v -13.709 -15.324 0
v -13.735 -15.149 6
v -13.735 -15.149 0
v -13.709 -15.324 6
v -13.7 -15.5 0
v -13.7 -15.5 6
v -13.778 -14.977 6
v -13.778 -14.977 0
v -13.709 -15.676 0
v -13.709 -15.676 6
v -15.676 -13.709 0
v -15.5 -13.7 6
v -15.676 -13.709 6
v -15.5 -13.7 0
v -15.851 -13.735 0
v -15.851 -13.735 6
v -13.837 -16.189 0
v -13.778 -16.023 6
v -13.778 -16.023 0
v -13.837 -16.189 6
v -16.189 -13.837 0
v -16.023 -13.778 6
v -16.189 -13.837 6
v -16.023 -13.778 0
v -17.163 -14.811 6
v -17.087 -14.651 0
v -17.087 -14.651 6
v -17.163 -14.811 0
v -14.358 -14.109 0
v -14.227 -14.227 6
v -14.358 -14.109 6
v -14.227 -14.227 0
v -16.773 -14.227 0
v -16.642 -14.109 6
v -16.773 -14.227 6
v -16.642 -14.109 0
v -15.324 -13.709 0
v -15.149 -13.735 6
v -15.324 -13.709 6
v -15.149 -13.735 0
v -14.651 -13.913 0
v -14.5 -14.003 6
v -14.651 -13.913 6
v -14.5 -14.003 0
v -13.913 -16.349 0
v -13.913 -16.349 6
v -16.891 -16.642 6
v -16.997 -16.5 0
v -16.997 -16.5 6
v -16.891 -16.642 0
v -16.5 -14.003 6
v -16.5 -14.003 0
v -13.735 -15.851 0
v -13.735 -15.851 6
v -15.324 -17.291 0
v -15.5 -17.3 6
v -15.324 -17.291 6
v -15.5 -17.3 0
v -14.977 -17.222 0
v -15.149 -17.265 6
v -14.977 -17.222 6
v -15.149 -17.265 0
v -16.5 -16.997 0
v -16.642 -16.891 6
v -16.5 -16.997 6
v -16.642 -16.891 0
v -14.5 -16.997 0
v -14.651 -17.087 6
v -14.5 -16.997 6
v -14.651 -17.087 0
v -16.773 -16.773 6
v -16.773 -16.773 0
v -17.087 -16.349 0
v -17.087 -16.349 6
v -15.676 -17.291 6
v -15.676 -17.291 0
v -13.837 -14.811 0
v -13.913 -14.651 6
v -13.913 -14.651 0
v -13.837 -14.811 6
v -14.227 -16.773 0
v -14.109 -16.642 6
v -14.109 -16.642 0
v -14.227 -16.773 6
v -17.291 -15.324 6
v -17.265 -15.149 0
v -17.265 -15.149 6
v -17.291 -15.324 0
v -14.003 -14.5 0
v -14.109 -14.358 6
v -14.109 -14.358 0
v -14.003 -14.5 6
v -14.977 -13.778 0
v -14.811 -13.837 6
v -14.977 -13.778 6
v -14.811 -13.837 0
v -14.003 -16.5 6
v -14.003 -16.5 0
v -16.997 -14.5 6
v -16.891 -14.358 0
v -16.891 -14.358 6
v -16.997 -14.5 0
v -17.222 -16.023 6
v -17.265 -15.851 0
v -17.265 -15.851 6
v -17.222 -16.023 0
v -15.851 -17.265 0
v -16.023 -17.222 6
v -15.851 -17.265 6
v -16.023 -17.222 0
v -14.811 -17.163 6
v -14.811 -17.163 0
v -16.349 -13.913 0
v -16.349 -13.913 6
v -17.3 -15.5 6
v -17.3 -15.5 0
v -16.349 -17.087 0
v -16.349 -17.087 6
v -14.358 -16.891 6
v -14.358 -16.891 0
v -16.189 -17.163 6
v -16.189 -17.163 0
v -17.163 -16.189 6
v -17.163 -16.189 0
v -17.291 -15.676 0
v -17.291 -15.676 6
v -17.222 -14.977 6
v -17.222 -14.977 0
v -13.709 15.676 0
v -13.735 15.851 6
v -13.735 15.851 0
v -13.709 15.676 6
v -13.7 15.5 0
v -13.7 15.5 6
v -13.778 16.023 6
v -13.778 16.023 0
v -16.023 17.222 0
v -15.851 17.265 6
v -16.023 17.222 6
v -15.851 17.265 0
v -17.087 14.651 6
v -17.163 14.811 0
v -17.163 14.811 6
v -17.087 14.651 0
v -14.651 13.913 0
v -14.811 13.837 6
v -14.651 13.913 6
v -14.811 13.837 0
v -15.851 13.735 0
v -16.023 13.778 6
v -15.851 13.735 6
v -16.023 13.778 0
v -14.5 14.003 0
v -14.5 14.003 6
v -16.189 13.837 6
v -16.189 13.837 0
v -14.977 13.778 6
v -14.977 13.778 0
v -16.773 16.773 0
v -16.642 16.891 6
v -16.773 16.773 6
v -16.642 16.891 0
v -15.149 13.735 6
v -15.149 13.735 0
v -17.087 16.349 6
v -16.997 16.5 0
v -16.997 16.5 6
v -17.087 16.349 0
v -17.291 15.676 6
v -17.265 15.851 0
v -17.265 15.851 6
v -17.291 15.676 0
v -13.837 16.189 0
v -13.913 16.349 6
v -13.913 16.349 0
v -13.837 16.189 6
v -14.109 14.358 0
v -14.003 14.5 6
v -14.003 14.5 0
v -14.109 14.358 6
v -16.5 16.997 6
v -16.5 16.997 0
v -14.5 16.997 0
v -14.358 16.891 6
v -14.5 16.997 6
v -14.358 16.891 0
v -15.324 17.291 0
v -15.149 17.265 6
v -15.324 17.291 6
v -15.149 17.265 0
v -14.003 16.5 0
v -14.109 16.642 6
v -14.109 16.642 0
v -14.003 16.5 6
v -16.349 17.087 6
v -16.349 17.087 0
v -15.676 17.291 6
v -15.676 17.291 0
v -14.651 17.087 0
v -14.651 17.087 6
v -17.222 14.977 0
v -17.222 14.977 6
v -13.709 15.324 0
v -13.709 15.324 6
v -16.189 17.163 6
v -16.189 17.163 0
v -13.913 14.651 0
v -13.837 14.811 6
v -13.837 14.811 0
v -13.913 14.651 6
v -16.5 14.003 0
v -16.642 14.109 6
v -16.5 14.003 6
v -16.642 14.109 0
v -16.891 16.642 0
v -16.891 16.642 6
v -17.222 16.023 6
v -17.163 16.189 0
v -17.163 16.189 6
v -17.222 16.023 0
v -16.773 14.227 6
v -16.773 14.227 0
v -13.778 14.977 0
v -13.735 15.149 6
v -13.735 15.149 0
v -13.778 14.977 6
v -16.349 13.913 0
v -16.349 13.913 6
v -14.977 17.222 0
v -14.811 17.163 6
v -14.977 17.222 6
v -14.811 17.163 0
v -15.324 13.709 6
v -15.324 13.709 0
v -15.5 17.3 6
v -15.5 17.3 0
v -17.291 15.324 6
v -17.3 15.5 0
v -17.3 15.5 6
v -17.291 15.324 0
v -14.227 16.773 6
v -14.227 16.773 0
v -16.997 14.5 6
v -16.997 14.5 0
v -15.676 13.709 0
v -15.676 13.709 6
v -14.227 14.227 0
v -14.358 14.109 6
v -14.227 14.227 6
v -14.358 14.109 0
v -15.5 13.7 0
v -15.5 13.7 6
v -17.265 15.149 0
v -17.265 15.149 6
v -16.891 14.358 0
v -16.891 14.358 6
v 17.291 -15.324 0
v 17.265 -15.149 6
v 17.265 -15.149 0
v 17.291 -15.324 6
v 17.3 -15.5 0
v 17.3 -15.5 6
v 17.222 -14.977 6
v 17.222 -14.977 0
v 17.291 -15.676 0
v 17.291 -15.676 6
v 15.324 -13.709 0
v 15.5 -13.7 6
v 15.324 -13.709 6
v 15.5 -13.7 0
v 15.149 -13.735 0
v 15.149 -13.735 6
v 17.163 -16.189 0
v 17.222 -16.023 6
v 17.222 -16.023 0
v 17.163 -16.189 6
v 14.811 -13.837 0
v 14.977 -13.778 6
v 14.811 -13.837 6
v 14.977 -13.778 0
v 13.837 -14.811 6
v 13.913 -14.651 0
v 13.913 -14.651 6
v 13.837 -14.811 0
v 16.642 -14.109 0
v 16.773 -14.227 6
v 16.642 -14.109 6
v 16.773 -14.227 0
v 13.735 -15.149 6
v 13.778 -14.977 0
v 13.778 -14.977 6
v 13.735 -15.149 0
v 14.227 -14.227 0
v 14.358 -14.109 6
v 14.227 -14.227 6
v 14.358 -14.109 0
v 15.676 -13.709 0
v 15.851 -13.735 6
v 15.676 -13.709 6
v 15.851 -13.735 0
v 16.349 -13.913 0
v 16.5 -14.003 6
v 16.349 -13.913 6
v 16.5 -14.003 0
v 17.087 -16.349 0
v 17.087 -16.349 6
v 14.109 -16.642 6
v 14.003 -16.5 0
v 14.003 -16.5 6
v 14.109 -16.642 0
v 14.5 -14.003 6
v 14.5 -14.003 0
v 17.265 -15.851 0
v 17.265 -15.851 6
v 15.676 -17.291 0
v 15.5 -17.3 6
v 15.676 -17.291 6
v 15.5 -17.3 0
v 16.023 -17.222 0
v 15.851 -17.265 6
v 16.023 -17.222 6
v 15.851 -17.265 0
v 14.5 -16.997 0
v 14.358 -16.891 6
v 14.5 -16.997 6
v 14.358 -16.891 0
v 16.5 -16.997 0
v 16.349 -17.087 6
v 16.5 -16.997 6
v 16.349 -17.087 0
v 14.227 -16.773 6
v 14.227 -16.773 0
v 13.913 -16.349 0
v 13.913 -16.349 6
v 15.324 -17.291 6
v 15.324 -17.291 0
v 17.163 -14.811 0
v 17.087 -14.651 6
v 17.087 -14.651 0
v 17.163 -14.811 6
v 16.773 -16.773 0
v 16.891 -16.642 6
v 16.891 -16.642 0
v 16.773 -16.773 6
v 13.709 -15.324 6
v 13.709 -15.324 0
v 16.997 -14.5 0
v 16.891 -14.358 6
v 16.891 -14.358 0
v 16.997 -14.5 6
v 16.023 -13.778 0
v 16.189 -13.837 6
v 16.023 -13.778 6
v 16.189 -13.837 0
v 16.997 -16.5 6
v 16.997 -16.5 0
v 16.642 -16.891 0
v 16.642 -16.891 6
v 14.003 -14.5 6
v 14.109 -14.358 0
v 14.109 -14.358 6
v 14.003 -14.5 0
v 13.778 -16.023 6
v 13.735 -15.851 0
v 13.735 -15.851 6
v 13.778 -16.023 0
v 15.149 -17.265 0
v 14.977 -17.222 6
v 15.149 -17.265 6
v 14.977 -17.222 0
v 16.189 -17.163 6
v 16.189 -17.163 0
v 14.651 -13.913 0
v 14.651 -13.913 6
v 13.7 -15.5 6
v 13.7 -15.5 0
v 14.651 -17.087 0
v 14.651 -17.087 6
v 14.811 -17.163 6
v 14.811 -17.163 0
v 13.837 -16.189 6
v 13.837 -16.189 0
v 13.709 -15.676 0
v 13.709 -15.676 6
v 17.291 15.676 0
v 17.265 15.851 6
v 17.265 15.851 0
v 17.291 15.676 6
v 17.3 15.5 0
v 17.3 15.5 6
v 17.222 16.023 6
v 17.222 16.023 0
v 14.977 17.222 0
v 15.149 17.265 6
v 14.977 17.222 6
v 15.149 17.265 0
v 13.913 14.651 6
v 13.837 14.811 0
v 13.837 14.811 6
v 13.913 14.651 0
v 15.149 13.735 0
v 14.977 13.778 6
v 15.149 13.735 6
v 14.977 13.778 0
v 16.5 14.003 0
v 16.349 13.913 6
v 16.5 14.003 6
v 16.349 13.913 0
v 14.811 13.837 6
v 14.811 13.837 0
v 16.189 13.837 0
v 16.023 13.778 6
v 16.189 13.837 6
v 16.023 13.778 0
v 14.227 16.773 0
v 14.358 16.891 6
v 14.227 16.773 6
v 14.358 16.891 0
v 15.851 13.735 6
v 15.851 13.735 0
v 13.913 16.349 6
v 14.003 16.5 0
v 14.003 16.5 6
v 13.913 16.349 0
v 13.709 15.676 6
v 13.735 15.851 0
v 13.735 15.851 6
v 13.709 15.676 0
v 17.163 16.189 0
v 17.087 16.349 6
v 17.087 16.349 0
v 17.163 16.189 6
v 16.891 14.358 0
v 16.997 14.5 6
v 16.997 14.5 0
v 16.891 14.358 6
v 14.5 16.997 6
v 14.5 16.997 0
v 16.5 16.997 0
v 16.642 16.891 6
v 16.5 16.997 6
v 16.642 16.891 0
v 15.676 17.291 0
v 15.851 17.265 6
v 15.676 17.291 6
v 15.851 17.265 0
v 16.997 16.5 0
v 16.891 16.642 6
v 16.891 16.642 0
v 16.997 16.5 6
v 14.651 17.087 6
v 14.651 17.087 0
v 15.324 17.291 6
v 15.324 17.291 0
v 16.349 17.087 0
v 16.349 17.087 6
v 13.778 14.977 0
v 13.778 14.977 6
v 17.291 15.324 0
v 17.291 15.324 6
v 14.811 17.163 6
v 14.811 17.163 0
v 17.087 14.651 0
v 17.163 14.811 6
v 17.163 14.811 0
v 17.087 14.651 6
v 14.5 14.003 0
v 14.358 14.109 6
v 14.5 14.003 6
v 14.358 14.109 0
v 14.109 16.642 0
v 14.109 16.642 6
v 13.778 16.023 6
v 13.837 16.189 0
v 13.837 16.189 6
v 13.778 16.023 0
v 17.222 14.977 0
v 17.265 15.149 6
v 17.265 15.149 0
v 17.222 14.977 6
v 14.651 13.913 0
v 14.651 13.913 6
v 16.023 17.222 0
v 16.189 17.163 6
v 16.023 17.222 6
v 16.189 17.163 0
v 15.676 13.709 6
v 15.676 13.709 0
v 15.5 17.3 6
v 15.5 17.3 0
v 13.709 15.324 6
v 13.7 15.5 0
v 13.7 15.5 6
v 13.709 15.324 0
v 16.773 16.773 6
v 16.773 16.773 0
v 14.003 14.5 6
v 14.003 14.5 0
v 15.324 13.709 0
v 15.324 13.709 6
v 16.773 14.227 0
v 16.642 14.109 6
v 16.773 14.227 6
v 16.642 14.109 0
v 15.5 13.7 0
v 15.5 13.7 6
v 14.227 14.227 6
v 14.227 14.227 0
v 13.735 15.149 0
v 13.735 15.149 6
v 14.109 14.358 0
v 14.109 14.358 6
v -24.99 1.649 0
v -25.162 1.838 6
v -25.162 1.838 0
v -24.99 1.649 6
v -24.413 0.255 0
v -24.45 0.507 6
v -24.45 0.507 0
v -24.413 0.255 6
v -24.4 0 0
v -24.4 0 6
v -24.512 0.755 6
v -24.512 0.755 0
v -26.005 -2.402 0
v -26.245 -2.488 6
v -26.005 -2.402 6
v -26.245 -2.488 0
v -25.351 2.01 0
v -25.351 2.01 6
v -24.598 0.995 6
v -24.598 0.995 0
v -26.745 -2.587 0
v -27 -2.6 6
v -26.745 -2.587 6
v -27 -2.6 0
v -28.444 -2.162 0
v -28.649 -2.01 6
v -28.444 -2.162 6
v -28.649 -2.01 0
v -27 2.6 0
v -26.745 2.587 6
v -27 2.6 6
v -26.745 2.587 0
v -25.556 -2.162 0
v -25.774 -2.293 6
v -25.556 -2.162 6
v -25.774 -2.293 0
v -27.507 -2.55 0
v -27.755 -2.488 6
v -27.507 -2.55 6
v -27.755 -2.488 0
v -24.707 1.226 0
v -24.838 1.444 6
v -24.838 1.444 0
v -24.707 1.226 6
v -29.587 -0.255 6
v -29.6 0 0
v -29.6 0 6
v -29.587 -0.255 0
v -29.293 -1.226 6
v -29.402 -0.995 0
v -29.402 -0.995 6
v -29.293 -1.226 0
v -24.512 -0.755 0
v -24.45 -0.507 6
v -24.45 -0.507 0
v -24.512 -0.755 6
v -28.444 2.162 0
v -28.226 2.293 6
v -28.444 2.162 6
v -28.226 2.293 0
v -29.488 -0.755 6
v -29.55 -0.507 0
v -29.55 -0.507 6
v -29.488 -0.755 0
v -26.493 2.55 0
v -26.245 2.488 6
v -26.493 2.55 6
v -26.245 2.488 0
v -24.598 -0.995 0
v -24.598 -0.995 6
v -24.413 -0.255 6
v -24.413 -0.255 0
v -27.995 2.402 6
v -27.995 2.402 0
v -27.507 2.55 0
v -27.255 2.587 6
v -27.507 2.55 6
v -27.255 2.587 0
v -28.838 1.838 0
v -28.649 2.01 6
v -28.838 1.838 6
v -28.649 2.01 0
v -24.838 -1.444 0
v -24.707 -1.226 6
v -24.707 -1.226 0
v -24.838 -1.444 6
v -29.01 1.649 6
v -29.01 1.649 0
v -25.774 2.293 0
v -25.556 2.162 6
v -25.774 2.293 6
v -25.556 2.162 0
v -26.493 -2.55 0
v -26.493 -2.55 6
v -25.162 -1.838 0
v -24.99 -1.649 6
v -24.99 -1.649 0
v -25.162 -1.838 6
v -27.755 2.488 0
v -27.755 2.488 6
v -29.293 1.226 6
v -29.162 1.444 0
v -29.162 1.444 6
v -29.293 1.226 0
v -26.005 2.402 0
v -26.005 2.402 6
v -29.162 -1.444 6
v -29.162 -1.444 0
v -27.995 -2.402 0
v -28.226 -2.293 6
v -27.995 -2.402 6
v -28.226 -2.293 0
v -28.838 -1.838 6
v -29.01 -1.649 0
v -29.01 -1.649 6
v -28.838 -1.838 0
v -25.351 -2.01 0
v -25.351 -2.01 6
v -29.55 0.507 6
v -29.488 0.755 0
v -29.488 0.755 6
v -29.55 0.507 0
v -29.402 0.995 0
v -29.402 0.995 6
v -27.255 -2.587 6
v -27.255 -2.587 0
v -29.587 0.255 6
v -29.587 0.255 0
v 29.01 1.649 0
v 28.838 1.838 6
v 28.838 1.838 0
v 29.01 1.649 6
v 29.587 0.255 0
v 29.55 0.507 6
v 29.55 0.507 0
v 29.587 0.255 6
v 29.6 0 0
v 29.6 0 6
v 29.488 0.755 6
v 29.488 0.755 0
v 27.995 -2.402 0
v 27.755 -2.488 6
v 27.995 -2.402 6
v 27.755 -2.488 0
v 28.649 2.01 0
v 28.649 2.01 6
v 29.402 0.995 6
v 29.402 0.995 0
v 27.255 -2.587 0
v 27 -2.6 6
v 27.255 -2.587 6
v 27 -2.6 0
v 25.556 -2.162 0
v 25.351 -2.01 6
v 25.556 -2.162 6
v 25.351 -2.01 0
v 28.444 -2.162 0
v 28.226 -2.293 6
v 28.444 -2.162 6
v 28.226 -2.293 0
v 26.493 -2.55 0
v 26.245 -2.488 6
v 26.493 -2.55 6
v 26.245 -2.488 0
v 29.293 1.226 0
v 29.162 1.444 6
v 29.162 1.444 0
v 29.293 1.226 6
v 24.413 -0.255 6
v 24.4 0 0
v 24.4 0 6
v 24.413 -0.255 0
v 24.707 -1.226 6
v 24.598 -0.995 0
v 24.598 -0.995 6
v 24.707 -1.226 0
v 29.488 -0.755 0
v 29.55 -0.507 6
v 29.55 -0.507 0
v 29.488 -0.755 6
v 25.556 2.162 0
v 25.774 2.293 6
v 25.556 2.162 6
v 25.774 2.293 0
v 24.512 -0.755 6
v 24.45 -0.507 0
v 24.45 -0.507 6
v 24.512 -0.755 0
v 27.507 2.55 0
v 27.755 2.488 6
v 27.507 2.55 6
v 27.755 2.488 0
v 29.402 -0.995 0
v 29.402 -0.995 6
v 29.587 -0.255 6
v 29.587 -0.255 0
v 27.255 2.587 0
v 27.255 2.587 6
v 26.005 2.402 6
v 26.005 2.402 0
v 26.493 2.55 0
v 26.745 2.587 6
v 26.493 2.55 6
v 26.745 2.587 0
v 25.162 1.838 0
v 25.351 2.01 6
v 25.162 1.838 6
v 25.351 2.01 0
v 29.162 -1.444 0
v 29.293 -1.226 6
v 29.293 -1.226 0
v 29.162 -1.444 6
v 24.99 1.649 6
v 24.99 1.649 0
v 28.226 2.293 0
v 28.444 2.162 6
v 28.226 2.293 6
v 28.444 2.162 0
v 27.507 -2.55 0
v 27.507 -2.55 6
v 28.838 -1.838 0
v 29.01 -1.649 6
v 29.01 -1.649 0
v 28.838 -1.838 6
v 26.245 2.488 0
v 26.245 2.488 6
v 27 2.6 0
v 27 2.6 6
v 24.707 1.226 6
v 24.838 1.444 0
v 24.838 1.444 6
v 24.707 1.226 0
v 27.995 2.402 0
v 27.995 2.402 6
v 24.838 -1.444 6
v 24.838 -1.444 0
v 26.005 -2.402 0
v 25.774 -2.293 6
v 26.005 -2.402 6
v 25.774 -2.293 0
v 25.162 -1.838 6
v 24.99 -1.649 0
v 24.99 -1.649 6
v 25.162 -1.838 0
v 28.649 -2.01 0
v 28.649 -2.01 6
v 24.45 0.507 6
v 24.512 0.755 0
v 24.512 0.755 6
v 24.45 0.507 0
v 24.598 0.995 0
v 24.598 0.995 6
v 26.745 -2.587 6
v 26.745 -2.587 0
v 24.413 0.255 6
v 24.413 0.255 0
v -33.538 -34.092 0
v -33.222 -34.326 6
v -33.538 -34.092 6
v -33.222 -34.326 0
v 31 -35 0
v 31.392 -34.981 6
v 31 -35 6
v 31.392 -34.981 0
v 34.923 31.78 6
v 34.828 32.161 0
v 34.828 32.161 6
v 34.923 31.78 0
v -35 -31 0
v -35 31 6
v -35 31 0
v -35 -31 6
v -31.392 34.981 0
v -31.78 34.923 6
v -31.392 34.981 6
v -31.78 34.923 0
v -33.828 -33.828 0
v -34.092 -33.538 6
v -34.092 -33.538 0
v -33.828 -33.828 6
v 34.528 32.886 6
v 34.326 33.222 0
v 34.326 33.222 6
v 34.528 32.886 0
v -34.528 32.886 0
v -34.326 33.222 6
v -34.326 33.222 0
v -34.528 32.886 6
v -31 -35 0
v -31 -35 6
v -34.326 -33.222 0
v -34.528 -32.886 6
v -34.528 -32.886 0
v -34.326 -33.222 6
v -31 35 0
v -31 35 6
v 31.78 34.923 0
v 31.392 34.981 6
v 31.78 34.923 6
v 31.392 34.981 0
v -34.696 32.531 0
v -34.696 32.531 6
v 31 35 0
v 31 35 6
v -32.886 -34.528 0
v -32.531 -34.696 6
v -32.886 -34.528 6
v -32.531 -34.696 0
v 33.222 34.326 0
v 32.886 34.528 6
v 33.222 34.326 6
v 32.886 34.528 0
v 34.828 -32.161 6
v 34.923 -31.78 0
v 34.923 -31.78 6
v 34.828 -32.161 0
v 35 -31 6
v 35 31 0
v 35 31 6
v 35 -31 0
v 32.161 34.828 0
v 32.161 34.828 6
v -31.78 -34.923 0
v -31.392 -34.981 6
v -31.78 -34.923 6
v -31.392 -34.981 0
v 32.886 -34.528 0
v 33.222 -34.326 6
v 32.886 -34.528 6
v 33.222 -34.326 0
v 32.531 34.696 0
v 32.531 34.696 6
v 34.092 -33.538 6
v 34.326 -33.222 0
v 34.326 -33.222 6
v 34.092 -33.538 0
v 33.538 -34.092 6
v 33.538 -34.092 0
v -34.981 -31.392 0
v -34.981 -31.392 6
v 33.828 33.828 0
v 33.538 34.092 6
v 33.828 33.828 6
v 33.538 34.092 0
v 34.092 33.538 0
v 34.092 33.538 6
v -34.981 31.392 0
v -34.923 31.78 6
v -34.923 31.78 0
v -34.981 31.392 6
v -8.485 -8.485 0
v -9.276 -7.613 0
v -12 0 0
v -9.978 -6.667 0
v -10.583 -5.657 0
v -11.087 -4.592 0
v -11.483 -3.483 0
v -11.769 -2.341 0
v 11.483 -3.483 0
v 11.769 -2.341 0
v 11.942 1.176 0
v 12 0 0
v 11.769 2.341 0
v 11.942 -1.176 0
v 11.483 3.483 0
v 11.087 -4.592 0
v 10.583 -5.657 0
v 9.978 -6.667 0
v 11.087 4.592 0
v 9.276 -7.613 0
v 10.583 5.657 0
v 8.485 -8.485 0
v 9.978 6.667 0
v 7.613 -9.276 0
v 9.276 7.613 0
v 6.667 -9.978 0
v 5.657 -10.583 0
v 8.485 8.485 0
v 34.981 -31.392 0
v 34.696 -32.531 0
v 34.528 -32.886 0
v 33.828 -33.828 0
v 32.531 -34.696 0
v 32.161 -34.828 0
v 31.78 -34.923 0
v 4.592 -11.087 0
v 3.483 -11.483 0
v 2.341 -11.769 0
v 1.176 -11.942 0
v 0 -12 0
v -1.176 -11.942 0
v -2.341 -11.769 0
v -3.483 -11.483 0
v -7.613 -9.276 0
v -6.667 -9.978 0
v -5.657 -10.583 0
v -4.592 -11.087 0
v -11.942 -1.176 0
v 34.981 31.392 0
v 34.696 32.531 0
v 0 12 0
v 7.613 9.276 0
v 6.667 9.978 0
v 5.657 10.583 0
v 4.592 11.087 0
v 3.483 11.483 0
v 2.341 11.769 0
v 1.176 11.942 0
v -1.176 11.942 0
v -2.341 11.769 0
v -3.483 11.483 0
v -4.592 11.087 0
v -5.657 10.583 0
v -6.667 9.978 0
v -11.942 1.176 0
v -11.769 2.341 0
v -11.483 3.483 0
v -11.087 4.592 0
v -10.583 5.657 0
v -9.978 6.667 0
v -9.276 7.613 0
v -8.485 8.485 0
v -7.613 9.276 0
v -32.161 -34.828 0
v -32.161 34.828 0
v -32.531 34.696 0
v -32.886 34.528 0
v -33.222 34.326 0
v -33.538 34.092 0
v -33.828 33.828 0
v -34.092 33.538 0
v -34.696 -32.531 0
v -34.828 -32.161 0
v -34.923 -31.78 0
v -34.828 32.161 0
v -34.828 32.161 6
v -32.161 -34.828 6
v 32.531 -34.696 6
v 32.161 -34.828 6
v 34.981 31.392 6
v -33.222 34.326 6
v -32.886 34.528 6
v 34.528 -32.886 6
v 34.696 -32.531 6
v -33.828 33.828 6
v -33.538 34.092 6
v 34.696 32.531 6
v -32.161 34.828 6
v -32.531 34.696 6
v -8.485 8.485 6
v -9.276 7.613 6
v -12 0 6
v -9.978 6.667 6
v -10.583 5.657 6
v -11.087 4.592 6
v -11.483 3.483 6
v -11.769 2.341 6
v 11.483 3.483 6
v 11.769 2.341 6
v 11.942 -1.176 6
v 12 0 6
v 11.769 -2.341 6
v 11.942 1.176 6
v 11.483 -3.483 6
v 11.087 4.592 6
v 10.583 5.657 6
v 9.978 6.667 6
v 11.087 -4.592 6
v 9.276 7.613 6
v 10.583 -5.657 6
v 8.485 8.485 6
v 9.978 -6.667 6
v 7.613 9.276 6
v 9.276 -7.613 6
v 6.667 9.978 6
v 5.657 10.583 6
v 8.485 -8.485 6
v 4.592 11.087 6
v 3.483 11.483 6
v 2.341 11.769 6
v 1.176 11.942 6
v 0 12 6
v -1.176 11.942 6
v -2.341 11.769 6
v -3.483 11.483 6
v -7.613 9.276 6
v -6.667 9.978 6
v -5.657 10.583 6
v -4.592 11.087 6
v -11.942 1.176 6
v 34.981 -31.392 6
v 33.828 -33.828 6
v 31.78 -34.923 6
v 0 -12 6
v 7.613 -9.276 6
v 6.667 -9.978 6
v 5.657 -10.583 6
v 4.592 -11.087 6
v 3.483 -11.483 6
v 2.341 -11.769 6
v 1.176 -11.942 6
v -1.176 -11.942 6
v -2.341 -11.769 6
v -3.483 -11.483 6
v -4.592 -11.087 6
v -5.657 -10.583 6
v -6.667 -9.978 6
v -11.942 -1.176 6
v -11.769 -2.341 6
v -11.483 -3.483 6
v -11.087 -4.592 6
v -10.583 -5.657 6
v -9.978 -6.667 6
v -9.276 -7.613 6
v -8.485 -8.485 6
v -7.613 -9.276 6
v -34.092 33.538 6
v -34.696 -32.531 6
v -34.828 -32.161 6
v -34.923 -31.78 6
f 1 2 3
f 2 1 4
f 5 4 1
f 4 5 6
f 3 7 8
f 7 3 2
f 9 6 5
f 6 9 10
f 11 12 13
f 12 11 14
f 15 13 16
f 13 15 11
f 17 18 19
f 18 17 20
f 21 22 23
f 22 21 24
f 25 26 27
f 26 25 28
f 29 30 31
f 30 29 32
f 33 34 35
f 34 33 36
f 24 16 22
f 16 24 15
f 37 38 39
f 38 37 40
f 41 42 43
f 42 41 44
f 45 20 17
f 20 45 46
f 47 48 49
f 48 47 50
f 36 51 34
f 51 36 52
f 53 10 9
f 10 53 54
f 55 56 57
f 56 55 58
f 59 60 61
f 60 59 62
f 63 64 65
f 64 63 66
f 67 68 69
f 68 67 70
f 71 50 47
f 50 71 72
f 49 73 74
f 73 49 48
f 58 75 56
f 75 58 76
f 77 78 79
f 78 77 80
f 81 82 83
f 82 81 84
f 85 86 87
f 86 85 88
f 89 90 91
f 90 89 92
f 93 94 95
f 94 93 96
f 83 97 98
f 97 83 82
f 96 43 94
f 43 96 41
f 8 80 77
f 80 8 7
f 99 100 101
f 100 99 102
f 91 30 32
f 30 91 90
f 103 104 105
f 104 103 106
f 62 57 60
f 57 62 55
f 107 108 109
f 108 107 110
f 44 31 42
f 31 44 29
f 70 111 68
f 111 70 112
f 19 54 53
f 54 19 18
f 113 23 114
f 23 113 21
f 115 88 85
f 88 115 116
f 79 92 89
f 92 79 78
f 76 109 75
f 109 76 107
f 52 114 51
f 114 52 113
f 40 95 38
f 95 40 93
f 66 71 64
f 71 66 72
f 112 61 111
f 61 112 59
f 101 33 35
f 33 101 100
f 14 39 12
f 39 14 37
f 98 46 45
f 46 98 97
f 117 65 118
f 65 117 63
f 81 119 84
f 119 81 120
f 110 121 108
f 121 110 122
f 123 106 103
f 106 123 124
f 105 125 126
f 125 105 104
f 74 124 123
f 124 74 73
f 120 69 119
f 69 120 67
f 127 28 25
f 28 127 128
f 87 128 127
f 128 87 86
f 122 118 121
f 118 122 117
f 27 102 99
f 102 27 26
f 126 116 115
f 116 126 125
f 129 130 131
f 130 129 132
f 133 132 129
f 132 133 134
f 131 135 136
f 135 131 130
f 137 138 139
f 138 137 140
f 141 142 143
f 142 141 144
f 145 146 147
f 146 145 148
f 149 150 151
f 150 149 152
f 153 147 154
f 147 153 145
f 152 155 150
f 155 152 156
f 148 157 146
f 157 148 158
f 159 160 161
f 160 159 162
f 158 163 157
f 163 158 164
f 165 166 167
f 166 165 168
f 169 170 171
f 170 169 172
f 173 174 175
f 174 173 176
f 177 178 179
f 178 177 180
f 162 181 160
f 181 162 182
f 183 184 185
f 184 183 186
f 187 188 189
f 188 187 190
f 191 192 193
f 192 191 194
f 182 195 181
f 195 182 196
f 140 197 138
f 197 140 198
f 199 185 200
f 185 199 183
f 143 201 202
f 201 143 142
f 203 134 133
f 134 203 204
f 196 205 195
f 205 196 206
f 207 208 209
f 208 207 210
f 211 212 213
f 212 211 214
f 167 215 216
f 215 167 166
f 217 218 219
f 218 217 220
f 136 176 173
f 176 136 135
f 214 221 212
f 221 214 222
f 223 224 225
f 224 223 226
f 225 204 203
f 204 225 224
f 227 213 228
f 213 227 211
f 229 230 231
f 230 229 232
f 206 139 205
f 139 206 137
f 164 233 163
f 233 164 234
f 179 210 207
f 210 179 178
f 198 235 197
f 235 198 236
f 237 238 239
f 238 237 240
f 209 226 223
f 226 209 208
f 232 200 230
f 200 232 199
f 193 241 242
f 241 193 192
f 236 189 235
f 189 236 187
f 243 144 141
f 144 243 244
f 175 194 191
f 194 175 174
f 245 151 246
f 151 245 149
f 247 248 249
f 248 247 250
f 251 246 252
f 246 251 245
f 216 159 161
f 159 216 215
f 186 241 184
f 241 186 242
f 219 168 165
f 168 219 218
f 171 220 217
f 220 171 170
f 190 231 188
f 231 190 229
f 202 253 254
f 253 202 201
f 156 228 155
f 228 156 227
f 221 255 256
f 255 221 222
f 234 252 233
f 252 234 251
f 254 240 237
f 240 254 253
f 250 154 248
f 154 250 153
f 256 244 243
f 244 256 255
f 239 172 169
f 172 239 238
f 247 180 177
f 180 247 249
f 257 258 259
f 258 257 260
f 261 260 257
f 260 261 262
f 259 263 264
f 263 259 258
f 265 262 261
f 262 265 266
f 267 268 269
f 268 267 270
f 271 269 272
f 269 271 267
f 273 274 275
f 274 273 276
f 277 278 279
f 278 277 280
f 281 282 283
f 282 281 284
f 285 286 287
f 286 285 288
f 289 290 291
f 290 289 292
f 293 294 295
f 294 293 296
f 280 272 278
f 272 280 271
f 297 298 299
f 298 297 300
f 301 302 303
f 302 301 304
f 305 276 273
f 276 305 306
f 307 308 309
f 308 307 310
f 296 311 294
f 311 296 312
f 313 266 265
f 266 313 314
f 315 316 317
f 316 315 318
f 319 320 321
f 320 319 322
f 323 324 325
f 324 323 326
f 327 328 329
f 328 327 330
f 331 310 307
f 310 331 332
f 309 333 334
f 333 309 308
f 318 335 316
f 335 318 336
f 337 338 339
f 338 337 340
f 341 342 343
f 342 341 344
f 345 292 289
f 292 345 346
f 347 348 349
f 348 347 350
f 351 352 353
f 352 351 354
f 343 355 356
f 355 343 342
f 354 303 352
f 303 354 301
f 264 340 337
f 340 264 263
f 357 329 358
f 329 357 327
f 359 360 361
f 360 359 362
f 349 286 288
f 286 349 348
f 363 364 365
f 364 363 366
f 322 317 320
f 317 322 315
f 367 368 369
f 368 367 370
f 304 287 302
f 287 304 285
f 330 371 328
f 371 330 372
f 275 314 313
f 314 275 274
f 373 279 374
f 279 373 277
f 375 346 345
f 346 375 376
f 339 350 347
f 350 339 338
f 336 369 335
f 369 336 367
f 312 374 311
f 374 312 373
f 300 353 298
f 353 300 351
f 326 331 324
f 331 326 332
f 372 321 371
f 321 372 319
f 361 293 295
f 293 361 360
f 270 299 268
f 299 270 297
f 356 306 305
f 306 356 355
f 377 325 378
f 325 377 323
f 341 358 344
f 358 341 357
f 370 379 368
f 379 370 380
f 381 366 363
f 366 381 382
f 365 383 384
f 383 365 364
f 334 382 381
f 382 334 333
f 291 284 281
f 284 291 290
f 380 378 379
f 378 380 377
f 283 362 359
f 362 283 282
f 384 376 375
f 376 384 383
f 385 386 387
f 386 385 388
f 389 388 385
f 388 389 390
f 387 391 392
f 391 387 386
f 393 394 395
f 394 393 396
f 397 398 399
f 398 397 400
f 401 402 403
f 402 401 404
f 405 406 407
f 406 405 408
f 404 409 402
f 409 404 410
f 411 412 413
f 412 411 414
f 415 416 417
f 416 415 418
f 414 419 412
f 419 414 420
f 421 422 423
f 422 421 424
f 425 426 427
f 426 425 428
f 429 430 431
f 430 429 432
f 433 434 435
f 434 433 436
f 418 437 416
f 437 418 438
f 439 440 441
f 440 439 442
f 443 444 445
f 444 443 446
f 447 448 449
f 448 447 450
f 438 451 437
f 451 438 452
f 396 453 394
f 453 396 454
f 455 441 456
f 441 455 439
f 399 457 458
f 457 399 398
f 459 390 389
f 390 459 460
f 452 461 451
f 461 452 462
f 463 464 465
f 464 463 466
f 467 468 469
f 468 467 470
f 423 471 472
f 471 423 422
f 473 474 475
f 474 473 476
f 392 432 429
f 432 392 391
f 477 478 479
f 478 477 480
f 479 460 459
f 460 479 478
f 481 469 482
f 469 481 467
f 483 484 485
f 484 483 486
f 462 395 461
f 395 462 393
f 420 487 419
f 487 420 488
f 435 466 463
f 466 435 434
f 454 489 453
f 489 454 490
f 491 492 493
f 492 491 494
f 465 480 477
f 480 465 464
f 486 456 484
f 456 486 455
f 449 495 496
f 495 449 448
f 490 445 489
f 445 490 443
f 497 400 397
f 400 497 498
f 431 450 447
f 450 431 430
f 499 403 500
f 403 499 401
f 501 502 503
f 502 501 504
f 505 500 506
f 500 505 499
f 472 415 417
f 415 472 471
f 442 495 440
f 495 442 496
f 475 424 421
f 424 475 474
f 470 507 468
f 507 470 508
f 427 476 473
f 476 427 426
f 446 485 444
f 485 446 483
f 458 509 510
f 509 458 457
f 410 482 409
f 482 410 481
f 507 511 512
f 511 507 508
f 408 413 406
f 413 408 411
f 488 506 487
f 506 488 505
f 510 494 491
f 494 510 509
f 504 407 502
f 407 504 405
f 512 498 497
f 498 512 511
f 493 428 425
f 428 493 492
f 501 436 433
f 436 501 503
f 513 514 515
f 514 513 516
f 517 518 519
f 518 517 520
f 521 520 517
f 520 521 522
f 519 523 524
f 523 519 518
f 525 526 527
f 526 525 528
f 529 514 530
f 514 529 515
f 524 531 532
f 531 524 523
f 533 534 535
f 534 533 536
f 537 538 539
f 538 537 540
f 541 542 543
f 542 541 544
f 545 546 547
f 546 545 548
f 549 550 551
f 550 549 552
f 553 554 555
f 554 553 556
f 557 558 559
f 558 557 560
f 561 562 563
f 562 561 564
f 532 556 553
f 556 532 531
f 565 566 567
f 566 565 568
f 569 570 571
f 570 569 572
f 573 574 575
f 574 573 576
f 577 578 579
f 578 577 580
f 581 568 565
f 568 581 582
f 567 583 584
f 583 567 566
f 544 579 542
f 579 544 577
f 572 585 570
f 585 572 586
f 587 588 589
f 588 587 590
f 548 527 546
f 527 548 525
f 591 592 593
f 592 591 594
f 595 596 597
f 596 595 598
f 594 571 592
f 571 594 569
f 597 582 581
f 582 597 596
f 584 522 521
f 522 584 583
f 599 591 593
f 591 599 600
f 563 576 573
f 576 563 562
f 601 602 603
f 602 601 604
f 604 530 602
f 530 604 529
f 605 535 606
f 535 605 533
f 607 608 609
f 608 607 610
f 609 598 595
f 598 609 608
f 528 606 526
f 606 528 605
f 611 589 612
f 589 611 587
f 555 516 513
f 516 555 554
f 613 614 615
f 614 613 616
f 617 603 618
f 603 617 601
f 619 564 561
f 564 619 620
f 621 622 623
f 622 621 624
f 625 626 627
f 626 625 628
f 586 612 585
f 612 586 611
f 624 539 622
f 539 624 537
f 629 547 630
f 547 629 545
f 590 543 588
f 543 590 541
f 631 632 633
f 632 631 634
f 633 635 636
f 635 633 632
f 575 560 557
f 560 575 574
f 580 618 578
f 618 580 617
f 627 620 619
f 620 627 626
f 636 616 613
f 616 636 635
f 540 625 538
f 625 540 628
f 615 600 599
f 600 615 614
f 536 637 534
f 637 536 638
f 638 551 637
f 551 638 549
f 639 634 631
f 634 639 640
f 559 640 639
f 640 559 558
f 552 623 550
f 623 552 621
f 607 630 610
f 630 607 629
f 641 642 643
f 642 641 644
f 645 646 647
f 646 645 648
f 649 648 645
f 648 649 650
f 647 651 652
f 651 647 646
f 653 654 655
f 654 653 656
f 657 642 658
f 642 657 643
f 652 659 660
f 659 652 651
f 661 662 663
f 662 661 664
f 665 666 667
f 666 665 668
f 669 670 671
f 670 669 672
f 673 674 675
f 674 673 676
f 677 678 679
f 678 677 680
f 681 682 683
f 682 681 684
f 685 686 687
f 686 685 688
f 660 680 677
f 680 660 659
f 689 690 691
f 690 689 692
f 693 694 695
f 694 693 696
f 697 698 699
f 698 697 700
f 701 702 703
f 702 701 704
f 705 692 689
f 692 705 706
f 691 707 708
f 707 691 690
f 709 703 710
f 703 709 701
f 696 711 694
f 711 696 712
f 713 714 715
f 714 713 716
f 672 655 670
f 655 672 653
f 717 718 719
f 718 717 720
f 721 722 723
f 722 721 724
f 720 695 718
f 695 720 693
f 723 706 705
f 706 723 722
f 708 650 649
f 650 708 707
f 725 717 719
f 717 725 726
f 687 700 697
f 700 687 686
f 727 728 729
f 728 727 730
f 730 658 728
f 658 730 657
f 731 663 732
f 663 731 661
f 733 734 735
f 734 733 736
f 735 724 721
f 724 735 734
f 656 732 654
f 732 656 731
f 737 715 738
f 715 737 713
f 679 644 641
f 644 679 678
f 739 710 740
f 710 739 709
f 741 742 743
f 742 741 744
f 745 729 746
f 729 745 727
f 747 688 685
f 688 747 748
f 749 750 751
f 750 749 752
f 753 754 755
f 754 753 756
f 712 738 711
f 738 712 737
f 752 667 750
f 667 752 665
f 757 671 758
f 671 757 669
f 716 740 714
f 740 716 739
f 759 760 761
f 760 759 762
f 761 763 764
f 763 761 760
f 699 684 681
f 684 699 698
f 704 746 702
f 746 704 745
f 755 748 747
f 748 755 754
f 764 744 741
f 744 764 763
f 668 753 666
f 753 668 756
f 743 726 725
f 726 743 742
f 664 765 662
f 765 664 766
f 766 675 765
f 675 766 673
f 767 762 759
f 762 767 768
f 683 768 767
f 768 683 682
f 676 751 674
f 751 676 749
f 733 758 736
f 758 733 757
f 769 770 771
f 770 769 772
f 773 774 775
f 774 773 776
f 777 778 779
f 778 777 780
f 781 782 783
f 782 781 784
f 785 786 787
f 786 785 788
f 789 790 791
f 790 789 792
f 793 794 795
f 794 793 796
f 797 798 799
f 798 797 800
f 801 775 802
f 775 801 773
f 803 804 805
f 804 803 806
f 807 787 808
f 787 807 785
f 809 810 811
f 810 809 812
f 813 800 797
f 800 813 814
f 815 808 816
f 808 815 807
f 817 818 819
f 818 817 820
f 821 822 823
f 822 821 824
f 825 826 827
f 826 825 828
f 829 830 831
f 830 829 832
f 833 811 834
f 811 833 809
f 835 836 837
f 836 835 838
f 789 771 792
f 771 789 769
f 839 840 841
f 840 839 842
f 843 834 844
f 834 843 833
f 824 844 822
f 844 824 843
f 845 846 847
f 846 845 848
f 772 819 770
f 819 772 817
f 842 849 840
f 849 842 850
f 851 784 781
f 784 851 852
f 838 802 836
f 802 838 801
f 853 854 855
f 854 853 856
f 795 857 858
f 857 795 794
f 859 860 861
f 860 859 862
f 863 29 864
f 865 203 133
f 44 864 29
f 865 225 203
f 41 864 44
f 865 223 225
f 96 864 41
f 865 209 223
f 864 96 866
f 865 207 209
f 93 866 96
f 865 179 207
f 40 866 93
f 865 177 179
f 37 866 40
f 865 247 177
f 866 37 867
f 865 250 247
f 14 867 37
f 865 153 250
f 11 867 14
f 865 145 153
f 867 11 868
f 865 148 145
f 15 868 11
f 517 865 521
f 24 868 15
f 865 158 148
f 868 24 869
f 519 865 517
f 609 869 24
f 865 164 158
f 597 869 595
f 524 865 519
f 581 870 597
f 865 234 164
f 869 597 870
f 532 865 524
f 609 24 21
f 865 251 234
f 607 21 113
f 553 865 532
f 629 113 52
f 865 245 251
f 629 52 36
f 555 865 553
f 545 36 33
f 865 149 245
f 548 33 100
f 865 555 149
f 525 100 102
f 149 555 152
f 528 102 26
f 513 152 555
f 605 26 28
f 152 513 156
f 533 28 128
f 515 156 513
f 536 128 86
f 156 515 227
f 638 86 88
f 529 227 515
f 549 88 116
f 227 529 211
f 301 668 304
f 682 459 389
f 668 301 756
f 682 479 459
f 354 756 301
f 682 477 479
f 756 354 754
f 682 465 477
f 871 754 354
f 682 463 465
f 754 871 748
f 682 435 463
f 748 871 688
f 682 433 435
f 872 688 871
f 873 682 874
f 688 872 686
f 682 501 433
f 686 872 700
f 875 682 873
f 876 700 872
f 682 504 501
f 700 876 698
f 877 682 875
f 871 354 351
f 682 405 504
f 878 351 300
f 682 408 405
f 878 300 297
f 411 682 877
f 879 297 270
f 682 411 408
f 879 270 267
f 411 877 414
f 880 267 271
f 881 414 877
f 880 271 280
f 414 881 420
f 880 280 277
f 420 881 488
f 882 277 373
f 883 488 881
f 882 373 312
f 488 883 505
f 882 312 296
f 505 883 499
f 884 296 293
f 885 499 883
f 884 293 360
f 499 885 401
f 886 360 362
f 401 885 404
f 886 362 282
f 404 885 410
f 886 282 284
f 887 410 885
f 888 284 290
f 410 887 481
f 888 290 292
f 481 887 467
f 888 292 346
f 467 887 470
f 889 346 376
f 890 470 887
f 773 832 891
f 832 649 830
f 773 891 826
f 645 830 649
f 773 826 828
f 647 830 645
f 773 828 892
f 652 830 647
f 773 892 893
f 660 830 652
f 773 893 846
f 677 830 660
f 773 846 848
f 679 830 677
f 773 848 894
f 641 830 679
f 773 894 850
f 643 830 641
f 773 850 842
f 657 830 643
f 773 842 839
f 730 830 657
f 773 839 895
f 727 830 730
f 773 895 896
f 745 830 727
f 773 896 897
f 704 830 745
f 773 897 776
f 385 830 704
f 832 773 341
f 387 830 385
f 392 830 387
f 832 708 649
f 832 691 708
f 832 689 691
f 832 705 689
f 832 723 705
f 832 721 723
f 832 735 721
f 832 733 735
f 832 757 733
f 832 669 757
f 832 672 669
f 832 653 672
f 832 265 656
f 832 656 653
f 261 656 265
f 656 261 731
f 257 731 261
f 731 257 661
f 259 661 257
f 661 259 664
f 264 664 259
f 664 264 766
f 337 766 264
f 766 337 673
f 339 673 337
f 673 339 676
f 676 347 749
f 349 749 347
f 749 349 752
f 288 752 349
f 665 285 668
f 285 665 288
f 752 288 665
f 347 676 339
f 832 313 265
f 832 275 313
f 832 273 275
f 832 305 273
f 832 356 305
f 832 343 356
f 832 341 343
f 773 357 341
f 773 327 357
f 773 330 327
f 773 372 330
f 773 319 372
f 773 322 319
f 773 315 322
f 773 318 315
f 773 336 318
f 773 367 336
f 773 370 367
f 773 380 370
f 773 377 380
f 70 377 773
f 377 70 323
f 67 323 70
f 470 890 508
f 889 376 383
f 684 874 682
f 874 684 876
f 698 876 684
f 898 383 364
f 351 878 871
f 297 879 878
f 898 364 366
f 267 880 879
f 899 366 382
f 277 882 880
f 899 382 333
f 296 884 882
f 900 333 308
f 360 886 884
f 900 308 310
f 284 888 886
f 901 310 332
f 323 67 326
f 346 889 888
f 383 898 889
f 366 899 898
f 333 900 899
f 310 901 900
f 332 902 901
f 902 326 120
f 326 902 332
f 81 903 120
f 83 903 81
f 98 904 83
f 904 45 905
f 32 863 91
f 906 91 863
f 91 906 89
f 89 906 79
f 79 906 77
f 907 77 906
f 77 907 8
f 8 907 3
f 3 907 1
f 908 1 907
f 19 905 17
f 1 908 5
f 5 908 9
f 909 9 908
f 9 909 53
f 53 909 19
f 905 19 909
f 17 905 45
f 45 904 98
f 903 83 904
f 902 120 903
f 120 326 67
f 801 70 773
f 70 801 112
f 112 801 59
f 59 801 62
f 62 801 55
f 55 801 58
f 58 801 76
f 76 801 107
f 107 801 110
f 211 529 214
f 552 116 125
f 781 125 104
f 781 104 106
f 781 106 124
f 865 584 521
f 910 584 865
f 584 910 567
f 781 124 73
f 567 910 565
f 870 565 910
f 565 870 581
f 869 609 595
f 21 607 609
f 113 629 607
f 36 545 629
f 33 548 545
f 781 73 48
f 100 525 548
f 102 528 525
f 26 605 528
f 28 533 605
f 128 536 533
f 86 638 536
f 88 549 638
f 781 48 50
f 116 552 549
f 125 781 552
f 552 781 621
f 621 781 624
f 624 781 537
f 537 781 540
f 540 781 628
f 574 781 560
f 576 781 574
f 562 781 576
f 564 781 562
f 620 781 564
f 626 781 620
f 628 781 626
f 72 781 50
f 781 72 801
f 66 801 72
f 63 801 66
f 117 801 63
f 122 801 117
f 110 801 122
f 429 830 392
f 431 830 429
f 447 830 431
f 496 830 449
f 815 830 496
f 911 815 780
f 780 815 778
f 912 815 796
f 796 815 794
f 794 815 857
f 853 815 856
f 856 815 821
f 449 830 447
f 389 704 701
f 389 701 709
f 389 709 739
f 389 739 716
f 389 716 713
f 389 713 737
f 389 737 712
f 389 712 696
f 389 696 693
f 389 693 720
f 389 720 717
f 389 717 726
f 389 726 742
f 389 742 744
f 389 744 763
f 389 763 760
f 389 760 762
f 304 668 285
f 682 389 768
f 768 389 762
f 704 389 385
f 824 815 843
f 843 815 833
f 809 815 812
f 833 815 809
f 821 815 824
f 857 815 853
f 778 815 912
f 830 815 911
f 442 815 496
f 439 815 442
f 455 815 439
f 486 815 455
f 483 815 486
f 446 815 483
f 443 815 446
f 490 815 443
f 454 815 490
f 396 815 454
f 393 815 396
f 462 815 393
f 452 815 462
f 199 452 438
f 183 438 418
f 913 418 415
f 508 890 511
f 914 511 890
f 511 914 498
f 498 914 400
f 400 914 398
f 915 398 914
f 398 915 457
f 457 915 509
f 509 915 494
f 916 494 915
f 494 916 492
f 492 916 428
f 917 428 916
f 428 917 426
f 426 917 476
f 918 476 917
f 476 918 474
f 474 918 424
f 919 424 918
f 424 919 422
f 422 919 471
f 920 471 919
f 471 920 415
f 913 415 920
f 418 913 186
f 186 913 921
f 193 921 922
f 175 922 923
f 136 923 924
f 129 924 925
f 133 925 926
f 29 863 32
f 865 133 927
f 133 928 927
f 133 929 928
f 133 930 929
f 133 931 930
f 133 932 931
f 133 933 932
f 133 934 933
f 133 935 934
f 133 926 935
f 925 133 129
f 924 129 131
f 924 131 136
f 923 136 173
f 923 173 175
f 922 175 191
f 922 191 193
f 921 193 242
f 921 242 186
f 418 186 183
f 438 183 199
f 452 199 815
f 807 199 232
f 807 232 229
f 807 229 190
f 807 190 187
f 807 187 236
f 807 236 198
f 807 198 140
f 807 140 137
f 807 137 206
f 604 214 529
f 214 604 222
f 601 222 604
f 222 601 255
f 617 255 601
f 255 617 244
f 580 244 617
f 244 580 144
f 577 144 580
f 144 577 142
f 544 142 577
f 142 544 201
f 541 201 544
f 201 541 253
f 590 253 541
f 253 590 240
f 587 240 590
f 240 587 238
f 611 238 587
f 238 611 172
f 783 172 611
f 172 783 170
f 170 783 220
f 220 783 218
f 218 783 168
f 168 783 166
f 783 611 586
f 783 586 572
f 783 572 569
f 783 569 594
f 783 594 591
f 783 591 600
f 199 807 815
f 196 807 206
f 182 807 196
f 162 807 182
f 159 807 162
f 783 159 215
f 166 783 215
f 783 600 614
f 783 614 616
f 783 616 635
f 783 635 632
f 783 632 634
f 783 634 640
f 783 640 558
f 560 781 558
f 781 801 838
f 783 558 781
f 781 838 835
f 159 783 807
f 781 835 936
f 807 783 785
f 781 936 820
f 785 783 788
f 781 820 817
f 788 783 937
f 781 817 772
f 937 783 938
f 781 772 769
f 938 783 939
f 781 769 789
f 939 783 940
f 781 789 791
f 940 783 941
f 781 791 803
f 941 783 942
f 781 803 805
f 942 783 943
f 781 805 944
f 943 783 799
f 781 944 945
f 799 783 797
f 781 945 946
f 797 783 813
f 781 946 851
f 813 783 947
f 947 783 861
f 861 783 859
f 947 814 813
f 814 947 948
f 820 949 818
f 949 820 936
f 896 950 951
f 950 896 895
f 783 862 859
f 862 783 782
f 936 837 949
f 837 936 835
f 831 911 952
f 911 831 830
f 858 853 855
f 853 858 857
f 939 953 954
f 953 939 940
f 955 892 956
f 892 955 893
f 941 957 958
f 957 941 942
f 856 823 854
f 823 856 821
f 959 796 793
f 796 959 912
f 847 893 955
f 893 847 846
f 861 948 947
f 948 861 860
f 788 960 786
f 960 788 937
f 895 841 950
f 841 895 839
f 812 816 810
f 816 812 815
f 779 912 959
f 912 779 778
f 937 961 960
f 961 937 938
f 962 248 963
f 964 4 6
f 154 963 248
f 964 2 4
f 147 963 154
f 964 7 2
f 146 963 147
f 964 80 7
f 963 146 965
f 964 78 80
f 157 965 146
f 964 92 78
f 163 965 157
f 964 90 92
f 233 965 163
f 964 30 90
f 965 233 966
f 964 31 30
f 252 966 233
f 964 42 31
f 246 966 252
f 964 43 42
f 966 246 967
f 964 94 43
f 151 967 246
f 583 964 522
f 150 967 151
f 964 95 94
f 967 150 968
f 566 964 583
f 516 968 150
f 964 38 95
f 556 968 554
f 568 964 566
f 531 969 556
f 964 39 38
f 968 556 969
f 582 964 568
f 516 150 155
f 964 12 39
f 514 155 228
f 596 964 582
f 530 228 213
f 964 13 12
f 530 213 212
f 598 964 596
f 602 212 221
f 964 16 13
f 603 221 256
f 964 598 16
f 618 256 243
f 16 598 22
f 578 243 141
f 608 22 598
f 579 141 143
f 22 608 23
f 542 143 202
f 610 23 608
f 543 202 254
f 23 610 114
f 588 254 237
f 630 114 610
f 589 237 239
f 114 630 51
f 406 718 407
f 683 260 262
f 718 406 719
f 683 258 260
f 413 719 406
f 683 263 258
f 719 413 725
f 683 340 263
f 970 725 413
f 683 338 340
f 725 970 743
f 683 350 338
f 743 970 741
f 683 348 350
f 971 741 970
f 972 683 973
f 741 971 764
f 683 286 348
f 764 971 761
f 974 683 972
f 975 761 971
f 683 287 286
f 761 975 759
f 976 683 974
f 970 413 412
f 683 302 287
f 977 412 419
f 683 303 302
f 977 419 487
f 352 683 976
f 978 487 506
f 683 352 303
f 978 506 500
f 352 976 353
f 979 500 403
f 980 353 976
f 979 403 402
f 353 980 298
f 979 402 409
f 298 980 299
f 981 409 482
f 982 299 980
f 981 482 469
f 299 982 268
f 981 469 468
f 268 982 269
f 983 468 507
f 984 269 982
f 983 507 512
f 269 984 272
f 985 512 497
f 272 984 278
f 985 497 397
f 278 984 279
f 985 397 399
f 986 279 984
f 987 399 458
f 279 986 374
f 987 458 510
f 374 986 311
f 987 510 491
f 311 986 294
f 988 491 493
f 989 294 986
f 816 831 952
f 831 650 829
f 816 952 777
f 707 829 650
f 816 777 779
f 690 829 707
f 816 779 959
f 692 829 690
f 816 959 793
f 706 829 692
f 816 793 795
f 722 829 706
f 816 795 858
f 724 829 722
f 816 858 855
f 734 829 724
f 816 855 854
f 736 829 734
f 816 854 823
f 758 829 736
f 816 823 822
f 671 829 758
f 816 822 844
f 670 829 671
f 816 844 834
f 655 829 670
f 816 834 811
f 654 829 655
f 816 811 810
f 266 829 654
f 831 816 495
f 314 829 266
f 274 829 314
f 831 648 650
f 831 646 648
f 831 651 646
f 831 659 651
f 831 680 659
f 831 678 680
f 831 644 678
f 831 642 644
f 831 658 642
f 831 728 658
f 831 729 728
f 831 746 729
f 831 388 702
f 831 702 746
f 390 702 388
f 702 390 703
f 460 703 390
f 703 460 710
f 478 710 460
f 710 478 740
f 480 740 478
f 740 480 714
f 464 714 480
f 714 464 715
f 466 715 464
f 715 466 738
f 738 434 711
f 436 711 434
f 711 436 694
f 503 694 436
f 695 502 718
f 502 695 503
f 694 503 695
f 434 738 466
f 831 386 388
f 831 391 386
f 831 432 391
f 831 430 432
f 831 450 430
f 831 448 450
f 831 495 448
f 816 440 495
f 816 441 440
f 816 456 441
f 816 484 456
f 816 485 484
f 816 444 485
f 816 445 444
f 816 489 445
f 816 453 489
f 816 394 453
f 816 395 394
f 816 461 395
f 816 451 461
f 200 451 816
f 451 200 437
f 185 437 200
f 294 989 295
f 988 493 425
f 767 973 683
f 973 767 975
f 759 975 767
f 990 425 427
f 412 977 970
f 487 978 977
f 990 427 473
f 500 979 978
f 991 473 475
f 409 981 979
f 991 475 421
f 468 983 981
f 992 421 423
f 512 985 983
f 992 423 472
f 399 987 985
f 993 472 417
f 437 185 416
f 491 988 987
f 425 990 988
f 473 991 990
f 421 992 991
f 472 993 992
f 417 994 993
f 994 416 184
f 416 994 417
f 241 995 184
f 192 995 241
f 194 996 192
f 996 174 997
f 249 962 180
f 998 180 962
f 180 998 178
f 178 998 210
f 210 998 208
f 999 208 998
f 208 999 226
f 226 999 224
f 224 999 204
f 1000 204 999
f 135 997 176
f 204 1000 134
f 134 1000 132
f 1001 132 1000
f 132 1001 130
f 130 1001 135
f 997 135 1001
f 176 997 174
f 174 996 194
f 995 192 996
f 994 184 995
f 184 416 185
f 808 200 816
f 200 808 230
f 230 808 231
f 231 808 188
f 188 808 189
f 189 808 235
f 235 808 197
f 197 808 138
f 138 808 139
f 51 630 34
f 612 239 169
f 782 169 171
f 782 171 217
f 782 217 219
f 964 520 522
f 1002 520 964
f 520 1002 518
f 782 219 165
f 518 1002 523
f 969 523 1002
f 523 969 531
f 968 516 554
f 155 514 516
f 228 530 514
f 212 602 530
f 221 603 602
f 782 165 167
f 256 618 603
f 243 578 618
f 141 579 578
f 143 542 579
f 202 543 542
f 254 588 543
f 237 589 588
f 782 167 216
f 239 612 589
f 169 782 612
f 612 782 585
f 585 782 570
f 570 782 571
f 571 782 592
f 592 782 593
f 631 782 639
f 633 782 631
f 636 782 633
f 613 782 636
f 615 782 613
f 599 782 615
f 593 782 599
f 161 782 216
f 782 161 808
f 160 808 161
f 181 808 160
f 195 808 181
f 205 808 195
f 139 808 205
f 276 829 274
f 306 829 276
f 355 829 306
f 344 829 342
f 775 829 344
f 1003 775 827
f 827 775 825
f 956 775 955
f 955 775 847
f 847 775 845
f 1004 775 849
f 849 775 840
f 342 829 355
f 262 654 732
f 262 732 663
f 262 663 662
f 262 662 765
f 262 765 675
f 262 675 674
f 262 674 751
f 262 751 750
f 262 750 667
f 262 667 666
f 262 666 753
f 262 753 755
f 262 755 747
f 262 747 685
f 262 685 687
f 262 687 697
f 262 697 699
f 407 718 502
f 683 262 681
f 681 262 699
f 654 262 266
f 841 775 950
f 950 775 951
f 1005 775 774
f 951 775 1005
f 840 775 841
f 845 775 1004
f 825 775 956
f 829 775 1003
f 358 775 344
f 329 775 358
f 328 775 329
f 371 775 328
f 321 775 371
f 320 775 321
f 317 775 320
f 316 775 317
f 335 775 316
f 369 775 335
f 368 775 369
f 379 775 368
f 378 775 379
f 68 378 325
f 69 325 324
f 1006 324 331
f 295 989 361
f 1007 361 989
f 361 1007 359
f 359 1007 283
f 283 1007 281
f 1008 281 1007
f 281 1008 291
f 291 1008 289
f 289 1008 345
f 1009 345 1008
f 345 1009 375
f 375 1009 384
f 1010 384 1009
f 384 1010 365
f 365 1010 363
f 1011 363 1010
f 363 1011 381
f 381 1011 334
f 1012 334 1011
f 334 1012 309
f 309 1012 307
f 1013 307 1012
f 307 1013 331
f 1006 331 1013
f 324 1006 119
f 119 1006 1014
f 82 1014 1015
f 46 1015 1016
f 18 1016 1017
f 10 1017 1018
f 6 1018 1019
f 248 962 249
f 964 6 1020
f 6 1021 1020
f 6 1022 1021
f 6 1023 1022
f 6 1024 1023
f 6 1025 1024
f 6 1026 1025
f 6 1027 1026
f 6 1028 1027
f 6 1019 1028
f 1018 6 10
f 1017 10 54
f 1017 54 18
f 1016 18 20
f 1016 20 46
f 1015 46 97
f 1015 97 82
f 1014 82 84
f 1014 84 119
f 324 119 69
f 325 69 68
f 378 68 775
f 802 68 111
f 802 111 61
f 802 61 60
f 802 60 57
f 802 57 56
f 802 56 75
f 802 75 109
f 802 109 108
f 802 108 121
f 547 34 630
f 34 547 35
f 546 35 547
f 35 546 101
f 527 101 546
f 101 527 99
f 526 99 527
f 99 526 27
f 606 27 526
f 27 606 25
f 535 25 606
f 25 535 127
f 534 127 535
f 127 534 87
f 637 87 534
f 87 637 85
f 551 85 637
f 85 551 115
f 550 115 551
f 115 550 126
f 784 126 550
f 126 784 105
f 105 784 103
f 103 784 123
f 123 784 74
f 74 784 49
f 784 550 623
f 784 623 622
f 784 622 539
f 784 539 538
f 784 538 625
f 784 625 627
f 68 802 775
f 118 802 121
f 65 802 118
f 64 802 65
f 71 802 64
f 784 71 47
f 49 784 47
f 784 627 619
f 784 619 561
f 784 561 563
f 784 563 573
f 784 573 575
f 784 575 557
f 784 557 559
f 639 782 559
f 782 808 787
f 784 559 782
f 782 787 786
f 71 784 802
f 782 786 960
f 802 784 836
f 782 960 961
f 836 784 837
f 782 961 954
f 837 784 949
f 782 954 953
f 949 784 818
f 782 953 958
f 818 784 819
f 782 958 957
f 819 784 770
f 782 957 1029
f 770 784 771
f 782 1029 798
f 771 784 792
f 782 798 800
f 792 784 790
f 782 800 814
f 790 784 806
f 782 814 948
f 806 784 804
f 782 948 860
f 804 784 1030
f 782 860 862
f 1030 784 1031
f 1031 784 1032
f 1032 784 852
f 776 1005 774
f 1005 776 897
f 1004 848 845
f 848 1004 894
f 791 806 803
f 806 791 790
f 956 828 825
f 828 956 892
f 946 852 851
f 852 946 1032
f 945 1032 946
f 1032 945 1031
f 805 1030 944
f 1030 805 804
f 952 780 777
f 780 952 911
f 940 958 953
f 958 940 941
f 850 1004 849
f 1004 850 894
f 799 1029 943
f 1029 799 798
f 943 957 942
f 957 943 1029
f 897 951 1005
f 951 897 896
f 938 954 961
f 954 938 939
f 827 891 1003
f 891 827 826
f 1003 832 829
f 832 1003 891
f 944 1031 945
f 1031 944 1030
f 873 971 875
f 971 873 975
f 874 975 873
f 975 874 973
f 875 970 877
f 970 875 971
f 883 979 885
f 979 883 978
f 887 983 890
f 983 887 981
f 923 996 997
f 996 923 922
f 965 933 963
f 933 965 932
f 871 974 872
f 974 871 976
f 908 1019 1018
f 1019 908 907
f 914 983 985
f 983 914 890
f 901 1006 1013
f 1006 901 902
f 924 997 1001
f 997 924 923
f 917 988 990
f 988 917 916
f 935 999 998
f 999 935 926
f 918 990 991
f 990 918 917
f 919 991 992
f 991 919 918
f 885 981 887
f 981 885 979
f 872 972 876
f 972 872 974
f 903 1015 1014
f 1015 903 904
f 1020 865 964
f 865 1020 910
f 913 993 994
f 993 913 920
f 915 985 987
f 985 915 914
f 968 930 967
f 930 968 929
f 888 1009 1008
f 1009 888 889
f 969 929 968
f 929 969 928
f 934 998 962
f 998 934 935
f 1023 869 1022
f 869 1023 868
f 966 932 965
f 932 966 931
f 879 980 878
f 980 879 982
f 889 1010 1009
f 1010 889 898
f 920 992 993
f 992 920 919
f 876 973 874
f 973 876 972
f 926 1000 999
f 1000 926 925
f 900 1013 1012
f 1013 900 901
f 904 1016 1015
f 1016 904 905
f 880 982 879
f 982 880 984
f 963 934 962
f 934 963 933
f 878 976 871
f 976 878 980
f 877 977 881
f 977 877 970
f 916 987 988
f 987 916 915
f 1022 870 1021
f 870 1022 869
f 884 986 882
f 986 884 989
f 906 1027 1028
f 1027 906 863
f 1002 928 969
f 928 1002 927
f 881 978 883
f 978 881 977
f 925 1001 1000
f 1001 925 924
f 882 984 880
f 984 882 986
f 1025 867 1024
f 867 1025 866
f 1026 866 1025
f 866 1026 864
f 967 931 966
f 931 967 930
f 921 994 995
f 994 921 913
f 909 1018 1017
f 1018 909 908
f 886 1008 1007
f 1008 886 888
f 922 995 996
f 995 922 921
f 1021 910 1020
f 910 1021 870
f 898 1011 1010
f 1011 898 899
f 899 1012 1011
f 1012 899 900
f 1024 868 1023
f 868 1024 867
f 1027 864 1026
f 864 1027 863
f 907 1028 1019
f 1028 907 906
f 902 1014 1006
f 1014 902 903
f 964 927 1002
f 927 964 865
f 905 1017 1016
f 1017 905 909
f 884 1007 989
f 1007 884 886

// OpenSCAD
// CYD Satellite Tracker — NEMA17 motor mounting plate
// Check motor pilot, screw spacing and shaft clearance against the exact motor.
$fn=64;
plate_w=70; plate_h=70; plate_t=6;
motor_spacing=31; screw_d=3.6; center_clearance=24;
mount_spacing=54; mount_d=5.2;
difference(){
  linear_extrude(height=plate_t)
    offset(r=4) square([plate_w-8,plate_h-8],center=true);
  // NEMA17 31 mm square hole pattern
  for(x=[-motor_spacing/2,motor_spacing/2], y=[-motor_spacing/2,motor_spacing/2])
    translate([x,y,-0.1]) cylinder(h=plate_t+0.2,d=screw_d);
  translate([0,0,-0.1]) cylinder(h=plate_t+0.2,d=center_clearance);
  // Frame mounting holes
  for(x=[-mount_spacing/2,mount_spacing/2])
    translate([x,0,-0.1]) cylinder(h=plate_t+0.2,d=mount_d);
}
